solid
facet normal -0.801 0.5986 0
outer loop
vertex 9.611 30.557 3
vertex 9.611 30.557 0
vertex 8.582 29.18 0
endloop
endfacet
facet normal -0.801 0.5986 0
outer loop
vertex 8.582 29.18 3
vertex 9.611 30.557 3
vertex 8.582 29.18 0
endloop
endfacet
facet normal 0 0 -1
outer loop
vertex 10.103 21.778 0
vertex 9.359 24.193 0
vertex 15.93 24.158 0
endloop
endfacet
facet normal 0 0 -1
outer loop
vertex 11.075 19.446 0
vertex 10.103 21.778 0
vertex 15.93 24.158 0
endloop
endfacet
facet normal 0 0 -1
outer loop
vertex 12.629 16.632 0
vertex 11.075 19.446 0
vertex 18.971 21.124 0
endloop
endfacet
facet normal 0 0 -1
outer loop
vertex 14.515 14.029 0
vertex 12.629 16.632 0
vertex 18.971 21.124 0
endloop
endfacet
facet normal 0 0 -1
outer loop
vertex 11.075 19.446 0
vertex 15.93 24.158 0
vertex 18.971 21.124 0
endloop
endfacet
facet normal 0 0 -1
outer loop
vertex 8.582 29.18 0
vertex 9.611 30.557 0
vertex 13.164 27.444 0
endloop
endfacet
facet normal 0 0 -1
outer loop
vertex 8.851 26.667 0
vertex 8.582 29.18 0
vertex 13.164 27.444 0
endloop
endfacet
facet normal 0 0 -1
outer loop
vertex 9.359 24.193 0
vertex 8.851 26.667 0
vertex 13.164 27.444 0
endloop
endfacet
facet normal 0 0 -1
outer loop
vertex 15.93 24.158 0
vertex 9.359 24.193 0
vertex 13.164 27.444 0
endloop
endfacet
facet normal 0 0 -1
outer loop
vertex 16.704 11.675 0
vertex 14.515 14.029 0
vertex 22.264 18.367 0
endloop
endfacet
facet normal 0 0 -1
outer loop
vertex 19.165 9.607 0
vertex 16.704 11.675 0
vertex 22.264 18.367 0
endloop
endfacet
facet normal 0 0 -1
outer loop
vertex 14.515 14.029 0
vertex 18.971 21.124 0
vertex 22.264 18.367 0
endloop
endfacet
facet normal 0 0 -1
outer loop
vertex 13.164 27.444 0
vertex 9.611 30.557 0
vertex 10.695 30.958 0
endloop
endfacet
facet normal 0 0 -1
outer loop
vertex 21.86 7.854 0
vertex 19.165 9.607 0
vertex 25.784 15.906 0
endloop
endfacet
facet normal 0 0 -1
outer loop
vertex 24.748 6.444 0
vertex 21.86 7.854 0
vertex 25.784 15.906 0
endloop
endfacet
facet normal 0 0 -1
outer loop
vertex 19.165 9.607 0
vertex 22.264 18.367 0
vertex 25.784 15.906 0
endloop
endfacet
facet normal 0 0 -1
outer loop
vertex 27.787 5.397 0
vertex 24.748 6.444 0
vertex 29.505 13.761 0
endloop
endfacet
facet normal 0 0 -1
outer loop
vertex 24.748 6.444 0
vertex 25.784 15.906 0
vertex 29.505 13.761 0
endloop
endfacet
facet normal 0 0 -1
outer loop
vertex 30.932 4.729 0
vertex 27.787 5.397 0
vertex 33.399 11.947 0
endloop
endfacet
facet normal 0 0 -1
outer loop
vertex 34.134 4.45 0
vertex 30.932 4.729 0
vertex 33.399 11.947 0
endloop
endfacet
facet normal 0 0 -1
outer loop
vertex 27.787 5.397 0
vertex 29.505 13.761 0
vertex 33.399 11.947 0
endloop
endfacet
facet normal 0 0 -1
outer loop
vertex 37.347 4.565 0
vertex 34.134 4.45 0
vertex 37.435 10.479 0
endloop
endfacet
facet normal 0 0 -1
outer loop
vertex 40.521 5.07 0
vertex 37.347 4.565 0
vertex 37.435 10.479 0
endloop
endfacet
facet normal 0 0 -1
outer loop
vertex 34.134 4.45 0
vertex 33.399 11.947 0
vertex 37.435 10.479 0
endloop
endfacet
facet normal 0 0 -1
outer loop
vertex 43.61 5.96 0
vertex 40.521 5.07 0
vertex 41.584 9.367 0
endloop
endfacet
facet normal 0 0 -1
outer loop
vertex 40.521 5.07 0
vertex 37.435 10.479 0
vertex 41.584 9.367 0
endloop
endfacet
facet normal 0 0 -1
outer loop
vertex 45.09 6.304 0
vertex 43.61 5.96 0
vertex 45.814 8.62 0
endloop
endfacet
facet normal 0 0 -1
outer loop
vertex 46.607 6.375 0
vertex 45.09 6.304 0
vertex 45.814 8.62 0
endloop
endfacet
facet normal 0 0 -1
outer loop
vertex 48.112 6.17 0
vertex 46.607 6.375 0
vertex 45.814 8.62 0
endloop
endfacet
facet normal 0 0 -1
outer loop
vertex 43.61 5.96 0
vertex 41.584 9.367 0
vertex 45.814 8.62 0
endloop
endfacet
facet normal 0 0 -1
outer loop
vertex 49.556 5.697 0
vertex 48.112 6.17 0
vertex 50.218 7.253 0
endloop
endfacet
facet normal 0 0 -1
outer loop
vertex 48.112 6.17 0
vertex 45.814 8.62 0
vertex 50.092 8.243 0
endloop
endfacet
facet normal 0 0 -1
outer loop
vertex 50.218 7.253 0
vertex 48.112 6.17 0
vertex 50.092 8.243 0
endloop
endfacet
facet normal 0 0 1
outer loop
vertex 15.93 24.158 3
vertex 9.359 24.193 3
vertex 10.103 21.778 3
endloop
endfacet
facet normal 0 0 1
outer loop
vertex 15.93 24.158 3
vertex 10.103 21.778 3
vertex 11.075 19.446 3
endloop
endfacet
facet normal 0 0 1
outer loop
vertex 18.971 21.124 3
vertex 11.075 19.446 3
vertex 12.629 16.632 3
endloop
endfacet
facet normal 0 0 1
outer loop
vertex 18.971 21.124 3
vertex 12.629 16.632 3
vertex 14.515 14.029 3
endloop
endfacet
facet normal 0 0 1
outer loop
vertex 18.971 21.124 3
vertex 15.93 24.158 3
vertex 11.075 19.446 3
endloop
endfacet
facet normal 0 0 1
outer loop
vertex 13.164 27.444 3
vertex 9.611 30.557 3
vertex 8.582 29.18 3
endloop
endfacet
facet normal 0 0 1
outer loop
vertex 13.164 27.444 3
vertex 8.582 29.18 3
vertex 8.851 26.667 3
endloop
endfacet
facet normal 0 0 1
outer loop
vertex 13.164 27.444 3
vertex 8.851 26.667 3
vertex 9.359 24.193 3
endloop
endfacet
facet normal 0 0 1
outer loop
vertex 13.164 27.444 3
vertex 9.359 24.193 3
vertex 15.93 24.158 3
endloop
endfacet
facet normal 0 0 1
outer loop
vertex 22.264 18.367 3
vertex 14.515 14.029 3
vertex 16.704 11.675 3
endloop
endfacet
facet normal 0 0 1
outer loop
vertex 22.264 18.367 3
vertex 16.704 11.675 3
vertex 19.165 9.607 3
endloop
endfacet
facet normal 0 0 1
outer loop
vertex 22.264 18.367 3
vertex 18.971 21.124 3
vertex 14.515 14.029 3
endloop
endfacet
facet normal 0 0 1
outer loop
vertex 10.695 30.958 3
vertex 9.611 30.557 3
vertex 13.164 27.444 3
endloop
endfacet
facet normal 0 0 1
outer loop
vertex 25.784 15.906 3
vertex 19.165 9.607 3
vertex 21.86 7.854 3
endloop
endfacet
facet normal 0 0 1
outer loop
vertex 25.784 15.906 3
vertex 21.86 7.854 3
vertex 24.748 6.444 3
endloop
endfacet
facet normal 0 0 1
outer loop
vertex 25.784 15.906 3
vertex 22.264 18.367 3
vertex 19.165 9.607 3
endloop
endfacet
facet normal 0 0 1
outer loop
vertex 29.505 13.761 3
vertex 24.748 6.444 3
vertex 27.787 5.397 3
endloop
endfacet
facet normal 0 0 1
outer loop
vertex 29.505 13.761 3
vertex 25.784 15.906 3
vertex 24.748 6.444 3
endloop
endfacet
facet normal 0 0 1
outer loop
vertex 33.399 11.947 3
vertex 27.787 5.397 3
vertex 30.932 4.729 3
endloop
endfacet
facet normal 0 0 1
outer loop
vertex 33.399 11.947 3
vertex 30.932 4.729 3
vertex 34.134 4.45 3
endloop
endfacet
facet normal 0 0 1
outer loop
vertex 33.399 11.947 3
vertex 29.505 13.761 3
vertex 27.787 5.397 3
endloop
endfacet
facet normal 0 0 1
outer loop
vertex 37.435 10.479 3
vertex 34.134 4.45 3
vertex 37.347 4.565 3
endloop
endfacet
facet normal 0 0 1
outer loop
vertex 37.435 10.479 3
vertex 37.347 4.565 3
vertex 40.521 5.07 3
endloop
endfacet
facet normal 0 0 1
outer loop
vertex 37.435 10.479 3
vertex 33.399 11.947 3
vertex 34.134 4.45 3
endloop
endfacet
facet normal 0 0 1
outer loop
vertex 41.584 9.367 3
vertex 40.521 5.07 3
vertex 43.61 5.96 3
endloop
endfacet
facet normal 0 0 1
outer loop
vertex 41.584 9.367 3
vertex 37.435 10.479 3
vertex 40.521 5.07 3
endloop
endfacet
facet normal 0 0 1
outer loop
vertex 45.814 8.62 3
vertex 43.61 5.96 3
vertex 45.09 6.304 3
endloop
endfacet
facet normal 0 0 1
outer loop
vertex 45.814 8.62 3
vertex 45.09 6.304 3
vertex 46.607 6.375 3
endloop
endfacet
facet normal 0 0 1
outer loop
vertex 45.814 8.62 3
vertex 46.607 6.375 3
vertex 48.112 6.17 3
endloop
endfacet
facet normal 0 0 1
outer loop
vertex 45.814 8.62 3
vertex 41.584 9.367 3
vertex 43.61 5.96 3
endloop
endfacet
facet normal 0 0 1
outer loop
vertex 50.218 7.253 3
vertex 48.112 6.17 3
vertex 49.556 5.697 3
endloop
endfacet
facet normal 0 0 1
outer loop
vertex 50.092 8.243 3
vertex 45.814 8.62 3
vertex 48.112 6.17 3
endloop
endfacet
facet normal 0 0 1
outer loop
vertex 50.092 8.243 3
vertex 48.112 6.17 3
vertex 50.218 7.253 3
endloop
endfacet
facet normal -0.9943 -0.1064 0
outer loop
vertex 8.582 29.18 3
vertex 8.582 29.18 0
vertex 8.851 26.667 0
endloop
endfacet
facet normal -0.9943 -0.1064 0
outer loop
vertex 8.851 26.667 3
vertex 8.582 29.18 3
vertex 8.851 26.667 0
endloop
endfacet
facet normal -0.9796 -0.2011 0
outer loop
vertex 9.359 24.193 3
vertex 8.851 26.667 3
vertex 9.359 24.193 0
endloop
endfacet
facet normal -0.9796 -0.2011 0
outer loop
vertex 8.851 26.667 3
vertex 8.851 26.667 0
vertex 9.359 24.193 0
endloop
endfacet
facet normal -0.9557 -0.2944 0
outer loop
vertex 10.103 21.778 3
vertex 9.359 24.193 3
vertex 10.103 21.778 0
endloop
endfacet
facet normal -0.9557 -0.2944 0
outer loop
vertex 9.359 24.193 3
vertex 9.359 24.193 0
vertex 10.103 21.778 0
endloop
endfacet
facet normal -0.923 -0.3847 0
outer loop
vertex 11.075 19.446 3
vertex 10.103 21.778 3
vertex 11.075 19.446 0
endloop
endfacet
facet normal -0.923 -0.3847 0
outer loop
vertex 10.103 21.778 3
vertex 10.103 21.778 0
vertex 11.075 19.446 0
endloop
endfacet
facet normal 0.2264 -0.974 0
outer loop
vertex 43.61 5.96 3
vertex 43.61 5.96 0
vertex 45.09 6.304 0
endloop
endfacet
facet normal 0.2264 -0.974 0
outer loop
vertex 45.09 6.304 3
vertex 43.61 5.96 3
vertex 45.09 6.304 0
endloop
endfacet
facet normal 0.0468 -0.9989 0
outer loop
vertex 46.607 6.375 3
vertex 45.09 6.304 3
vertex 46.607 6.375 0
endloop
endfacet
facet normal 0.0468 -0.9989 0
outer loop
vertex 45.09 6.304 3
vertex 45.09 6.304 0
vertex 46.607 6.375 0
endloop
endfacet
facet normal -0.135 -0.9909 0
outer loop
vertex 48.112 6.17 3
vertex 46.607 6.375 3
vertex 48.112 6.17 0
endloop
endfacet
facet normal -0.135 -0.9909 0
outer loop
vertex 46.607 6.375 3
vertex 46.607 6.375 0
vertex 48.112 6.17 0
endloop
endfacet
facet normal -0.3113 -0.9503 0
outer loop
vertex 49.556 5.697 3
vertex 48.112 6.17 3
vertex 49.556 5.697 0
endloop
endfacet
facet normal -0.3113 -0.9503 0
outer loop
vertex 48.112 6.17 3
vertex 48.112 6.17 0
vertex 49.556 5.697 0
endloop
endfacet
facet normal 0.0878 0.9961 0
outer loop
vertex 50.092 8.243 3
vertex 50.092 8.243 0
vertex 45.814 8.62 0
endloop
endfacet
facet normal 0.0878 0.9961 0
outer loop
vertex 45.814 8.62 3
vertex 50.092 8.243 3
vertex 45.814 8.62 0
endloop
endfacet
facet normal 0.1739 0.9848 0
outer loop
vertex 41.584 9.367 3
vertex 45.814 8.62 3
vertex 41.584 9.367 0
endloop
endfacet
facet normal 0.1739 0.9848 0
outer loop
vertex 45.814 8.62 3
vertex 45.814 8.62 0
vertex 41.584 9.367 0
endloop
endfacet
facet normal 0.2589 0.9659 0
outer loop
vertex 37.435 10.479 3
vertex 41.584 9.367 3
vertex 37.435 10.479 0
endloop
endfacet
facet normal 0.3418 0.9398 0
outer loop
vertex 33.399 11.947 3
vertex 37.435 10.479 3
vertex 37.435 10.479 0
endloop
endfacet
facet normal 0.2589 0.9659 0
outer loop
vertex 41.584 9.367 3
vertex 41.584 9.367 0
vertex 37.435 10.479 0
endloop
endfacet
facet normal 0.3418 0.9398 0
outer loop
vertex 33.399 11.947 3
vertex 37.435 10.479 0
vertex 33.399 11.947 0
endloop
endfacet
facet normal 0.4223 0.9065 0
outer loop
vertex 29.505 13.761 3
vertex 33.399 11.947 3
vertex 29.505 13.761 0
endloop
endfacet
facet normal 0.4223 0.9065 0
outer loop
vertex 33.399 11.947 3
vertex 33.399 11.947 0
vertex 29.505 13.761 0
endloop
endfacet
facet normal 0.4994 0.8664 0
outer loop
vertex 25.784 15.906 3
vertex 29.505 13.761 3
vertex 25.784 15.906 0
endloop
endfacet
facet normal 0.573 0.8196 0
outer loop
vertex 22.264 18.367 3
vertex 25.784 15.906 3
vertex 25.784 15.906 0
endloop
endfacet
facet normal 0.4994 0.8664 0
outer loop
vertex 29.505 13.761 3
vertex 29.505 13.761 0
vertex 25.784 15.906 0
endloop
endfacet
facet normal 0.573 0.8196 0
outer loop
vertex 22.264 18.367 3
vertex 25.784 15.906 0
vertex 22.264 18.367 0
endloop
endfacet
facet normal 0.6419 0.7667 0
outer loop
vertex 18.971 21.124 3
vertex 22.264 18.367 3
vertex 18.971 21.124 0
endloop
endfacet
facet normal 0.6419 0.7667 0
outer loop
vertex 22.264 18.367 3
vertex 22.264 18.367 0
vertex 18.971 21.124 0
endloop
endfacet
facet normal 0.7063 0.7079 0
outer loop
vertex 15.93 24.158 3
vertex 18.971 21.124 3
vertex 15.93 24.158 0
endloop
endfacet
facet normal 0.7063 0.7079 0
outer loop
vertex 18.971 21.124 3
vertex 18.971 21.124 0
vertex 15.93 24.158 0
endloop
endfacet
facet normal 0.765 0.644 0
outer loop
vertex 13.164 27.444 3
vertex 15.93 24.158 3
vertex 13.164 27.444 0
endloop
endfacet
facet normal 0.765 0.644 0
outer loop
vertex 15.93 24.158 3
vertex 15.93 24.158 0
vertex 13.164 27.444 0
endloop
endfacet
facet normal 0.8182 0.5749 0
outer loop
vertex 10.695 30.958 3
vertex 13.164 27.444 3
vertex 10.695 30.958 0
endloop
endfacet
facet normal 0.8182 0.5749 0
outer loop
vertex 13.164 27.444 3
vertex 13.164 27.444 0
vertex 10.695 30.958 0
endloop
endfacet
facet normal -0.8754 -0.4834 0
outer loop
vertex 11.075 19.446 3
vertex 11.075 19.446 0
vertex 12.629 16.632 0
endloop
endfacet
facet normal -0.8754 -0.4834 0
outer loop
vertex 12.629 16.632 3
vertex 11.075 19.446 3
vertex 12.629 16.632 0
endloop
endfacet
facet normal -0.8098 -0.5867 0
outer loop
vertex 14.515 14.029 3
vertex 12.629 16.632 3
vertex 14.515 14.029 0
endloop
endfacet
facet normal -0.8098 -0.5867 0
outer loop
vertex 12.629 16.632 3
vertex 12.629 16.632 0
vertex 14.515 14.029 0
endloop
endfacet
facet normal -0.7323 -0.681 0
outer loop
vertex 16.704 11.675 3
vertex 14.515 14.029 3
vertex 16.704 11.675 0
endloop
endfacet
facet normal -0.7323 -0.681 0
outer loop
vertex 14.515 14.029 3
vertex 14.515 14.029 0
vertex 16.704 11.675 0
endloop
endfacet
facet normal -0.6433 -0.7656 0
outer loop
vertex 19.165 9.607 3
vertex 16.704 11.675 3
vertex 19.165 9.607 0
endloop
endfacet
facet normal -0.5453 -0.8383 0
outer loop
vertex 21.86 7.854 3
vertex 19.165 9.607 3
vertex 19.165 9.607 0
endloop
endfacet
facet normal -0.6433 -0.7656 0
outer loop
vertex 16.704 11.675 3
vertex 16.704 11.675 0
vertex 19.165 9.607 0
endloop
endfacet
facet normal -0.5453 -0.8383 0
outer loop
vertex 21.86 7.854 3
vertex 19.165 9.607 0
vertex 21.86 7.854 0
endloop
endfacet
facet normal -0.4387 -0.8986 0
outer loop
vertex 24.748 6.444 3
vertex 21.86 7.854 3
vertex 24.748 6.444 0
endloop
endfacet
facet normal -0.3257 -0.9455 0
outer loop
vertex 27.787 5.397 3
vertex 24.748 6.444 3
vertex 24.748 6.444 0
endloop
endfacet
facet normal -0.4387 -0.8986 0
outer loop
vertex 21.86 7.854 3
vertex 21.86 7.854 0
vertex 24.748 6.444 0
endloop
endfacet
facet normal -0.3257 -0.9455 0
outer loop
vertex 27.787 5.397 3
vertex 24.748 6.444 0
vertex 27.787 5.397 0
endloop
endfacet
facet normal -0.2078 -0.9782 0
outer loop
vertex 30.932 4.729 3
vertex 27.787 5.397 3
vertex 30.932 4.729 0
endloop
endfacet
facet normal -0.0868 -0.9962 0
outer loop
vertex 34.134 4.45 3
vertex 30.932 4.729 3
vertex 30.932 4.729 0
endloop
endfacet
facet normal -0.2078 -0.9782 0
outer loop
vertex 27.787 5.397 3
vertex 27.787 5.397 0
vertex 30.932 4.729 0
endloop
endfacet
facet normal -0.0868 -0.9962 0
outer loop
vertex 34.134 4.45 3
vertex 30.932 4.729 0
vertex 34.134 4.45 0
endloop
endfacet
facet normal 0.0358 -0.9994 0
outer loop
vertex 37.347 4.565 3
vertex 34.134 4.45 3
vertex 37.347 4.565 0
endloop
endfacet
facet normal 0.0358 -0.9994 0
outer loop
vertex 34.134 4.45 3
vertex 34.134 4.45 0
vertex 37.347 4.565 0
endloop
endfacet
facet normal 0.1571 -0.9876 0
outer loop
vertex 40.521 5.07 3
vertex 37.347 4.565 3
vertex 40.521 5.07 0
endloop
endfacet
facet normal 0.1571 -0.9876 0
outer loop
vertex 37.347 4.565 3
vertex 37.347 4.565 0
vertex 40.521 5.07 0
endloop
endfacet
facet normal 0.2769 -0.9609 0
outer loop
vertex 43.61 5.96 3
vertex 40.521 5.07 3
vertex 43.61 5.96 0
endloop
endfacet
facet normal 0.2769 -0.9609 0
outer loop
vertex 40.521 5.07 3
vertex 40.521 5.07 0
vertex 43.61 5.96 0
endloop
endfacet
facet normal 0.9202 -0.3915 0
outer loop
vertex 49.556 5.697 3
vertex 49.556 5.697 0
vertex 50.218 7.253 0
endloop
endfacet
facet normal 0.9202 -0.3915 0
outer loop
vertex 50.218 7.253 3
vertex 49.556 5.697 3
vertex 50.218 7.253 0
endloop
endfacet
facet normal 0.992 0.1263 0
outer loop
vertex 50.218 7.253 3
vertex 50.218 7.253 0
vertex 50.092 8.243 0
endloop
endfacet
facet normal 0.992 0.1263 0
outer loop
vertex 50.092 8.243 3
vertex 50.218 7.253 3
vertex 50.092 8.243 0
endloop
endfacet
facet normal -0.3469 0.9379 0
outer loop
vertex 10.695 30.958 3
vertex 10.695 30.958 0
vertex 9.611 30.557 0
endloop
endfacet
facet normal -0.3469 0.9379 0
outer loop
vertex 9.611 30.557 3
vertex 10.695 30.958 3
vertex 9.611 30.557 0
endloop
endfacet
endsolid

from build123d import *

# Parameters (mm, degrees)
SALIENTE_EXTRUIR1_DEPTH = 3


with BuildPart() as part:
    # Model → Saliente-Extruir1 (new body)
    with BuildSketch(Plane.XY):
        with BuildLine():
            Line((49.555981249, 5.697120887), (50.217934692, 7.253298598))
            Line((50.217934692, 7.253298598), (50.092452983, 8.243189758))
            ThreePointArc((50.092452983, 8.243189758), (27.621595202, 14.792954102), (10.694790748, 30.958415843))
            Line((10.694790748, 30.958415843), (9.611017038, 30.557274304))
            Line((9.611017038, 30.557274304), (8.582065308, 29.179502343))
            ThreePointArc((8.582065308, 29.179502343), (9.359106699, 24.192582613), (11.075472958, 19.446294739))
            ThreePointArc((11.075472958, 19.446294739), (24.748133849, 6.443892033), (43.61000442, 5.960187025))
            ThreePointArc((43.61000442, 5.960187025), (46.607144549, 6.374545334), (49.555981249, 5.697120887))
        make_face()
    extrude(amount=SALIENTE_EXTRUIR1_DEPTH)


solid = part.part
